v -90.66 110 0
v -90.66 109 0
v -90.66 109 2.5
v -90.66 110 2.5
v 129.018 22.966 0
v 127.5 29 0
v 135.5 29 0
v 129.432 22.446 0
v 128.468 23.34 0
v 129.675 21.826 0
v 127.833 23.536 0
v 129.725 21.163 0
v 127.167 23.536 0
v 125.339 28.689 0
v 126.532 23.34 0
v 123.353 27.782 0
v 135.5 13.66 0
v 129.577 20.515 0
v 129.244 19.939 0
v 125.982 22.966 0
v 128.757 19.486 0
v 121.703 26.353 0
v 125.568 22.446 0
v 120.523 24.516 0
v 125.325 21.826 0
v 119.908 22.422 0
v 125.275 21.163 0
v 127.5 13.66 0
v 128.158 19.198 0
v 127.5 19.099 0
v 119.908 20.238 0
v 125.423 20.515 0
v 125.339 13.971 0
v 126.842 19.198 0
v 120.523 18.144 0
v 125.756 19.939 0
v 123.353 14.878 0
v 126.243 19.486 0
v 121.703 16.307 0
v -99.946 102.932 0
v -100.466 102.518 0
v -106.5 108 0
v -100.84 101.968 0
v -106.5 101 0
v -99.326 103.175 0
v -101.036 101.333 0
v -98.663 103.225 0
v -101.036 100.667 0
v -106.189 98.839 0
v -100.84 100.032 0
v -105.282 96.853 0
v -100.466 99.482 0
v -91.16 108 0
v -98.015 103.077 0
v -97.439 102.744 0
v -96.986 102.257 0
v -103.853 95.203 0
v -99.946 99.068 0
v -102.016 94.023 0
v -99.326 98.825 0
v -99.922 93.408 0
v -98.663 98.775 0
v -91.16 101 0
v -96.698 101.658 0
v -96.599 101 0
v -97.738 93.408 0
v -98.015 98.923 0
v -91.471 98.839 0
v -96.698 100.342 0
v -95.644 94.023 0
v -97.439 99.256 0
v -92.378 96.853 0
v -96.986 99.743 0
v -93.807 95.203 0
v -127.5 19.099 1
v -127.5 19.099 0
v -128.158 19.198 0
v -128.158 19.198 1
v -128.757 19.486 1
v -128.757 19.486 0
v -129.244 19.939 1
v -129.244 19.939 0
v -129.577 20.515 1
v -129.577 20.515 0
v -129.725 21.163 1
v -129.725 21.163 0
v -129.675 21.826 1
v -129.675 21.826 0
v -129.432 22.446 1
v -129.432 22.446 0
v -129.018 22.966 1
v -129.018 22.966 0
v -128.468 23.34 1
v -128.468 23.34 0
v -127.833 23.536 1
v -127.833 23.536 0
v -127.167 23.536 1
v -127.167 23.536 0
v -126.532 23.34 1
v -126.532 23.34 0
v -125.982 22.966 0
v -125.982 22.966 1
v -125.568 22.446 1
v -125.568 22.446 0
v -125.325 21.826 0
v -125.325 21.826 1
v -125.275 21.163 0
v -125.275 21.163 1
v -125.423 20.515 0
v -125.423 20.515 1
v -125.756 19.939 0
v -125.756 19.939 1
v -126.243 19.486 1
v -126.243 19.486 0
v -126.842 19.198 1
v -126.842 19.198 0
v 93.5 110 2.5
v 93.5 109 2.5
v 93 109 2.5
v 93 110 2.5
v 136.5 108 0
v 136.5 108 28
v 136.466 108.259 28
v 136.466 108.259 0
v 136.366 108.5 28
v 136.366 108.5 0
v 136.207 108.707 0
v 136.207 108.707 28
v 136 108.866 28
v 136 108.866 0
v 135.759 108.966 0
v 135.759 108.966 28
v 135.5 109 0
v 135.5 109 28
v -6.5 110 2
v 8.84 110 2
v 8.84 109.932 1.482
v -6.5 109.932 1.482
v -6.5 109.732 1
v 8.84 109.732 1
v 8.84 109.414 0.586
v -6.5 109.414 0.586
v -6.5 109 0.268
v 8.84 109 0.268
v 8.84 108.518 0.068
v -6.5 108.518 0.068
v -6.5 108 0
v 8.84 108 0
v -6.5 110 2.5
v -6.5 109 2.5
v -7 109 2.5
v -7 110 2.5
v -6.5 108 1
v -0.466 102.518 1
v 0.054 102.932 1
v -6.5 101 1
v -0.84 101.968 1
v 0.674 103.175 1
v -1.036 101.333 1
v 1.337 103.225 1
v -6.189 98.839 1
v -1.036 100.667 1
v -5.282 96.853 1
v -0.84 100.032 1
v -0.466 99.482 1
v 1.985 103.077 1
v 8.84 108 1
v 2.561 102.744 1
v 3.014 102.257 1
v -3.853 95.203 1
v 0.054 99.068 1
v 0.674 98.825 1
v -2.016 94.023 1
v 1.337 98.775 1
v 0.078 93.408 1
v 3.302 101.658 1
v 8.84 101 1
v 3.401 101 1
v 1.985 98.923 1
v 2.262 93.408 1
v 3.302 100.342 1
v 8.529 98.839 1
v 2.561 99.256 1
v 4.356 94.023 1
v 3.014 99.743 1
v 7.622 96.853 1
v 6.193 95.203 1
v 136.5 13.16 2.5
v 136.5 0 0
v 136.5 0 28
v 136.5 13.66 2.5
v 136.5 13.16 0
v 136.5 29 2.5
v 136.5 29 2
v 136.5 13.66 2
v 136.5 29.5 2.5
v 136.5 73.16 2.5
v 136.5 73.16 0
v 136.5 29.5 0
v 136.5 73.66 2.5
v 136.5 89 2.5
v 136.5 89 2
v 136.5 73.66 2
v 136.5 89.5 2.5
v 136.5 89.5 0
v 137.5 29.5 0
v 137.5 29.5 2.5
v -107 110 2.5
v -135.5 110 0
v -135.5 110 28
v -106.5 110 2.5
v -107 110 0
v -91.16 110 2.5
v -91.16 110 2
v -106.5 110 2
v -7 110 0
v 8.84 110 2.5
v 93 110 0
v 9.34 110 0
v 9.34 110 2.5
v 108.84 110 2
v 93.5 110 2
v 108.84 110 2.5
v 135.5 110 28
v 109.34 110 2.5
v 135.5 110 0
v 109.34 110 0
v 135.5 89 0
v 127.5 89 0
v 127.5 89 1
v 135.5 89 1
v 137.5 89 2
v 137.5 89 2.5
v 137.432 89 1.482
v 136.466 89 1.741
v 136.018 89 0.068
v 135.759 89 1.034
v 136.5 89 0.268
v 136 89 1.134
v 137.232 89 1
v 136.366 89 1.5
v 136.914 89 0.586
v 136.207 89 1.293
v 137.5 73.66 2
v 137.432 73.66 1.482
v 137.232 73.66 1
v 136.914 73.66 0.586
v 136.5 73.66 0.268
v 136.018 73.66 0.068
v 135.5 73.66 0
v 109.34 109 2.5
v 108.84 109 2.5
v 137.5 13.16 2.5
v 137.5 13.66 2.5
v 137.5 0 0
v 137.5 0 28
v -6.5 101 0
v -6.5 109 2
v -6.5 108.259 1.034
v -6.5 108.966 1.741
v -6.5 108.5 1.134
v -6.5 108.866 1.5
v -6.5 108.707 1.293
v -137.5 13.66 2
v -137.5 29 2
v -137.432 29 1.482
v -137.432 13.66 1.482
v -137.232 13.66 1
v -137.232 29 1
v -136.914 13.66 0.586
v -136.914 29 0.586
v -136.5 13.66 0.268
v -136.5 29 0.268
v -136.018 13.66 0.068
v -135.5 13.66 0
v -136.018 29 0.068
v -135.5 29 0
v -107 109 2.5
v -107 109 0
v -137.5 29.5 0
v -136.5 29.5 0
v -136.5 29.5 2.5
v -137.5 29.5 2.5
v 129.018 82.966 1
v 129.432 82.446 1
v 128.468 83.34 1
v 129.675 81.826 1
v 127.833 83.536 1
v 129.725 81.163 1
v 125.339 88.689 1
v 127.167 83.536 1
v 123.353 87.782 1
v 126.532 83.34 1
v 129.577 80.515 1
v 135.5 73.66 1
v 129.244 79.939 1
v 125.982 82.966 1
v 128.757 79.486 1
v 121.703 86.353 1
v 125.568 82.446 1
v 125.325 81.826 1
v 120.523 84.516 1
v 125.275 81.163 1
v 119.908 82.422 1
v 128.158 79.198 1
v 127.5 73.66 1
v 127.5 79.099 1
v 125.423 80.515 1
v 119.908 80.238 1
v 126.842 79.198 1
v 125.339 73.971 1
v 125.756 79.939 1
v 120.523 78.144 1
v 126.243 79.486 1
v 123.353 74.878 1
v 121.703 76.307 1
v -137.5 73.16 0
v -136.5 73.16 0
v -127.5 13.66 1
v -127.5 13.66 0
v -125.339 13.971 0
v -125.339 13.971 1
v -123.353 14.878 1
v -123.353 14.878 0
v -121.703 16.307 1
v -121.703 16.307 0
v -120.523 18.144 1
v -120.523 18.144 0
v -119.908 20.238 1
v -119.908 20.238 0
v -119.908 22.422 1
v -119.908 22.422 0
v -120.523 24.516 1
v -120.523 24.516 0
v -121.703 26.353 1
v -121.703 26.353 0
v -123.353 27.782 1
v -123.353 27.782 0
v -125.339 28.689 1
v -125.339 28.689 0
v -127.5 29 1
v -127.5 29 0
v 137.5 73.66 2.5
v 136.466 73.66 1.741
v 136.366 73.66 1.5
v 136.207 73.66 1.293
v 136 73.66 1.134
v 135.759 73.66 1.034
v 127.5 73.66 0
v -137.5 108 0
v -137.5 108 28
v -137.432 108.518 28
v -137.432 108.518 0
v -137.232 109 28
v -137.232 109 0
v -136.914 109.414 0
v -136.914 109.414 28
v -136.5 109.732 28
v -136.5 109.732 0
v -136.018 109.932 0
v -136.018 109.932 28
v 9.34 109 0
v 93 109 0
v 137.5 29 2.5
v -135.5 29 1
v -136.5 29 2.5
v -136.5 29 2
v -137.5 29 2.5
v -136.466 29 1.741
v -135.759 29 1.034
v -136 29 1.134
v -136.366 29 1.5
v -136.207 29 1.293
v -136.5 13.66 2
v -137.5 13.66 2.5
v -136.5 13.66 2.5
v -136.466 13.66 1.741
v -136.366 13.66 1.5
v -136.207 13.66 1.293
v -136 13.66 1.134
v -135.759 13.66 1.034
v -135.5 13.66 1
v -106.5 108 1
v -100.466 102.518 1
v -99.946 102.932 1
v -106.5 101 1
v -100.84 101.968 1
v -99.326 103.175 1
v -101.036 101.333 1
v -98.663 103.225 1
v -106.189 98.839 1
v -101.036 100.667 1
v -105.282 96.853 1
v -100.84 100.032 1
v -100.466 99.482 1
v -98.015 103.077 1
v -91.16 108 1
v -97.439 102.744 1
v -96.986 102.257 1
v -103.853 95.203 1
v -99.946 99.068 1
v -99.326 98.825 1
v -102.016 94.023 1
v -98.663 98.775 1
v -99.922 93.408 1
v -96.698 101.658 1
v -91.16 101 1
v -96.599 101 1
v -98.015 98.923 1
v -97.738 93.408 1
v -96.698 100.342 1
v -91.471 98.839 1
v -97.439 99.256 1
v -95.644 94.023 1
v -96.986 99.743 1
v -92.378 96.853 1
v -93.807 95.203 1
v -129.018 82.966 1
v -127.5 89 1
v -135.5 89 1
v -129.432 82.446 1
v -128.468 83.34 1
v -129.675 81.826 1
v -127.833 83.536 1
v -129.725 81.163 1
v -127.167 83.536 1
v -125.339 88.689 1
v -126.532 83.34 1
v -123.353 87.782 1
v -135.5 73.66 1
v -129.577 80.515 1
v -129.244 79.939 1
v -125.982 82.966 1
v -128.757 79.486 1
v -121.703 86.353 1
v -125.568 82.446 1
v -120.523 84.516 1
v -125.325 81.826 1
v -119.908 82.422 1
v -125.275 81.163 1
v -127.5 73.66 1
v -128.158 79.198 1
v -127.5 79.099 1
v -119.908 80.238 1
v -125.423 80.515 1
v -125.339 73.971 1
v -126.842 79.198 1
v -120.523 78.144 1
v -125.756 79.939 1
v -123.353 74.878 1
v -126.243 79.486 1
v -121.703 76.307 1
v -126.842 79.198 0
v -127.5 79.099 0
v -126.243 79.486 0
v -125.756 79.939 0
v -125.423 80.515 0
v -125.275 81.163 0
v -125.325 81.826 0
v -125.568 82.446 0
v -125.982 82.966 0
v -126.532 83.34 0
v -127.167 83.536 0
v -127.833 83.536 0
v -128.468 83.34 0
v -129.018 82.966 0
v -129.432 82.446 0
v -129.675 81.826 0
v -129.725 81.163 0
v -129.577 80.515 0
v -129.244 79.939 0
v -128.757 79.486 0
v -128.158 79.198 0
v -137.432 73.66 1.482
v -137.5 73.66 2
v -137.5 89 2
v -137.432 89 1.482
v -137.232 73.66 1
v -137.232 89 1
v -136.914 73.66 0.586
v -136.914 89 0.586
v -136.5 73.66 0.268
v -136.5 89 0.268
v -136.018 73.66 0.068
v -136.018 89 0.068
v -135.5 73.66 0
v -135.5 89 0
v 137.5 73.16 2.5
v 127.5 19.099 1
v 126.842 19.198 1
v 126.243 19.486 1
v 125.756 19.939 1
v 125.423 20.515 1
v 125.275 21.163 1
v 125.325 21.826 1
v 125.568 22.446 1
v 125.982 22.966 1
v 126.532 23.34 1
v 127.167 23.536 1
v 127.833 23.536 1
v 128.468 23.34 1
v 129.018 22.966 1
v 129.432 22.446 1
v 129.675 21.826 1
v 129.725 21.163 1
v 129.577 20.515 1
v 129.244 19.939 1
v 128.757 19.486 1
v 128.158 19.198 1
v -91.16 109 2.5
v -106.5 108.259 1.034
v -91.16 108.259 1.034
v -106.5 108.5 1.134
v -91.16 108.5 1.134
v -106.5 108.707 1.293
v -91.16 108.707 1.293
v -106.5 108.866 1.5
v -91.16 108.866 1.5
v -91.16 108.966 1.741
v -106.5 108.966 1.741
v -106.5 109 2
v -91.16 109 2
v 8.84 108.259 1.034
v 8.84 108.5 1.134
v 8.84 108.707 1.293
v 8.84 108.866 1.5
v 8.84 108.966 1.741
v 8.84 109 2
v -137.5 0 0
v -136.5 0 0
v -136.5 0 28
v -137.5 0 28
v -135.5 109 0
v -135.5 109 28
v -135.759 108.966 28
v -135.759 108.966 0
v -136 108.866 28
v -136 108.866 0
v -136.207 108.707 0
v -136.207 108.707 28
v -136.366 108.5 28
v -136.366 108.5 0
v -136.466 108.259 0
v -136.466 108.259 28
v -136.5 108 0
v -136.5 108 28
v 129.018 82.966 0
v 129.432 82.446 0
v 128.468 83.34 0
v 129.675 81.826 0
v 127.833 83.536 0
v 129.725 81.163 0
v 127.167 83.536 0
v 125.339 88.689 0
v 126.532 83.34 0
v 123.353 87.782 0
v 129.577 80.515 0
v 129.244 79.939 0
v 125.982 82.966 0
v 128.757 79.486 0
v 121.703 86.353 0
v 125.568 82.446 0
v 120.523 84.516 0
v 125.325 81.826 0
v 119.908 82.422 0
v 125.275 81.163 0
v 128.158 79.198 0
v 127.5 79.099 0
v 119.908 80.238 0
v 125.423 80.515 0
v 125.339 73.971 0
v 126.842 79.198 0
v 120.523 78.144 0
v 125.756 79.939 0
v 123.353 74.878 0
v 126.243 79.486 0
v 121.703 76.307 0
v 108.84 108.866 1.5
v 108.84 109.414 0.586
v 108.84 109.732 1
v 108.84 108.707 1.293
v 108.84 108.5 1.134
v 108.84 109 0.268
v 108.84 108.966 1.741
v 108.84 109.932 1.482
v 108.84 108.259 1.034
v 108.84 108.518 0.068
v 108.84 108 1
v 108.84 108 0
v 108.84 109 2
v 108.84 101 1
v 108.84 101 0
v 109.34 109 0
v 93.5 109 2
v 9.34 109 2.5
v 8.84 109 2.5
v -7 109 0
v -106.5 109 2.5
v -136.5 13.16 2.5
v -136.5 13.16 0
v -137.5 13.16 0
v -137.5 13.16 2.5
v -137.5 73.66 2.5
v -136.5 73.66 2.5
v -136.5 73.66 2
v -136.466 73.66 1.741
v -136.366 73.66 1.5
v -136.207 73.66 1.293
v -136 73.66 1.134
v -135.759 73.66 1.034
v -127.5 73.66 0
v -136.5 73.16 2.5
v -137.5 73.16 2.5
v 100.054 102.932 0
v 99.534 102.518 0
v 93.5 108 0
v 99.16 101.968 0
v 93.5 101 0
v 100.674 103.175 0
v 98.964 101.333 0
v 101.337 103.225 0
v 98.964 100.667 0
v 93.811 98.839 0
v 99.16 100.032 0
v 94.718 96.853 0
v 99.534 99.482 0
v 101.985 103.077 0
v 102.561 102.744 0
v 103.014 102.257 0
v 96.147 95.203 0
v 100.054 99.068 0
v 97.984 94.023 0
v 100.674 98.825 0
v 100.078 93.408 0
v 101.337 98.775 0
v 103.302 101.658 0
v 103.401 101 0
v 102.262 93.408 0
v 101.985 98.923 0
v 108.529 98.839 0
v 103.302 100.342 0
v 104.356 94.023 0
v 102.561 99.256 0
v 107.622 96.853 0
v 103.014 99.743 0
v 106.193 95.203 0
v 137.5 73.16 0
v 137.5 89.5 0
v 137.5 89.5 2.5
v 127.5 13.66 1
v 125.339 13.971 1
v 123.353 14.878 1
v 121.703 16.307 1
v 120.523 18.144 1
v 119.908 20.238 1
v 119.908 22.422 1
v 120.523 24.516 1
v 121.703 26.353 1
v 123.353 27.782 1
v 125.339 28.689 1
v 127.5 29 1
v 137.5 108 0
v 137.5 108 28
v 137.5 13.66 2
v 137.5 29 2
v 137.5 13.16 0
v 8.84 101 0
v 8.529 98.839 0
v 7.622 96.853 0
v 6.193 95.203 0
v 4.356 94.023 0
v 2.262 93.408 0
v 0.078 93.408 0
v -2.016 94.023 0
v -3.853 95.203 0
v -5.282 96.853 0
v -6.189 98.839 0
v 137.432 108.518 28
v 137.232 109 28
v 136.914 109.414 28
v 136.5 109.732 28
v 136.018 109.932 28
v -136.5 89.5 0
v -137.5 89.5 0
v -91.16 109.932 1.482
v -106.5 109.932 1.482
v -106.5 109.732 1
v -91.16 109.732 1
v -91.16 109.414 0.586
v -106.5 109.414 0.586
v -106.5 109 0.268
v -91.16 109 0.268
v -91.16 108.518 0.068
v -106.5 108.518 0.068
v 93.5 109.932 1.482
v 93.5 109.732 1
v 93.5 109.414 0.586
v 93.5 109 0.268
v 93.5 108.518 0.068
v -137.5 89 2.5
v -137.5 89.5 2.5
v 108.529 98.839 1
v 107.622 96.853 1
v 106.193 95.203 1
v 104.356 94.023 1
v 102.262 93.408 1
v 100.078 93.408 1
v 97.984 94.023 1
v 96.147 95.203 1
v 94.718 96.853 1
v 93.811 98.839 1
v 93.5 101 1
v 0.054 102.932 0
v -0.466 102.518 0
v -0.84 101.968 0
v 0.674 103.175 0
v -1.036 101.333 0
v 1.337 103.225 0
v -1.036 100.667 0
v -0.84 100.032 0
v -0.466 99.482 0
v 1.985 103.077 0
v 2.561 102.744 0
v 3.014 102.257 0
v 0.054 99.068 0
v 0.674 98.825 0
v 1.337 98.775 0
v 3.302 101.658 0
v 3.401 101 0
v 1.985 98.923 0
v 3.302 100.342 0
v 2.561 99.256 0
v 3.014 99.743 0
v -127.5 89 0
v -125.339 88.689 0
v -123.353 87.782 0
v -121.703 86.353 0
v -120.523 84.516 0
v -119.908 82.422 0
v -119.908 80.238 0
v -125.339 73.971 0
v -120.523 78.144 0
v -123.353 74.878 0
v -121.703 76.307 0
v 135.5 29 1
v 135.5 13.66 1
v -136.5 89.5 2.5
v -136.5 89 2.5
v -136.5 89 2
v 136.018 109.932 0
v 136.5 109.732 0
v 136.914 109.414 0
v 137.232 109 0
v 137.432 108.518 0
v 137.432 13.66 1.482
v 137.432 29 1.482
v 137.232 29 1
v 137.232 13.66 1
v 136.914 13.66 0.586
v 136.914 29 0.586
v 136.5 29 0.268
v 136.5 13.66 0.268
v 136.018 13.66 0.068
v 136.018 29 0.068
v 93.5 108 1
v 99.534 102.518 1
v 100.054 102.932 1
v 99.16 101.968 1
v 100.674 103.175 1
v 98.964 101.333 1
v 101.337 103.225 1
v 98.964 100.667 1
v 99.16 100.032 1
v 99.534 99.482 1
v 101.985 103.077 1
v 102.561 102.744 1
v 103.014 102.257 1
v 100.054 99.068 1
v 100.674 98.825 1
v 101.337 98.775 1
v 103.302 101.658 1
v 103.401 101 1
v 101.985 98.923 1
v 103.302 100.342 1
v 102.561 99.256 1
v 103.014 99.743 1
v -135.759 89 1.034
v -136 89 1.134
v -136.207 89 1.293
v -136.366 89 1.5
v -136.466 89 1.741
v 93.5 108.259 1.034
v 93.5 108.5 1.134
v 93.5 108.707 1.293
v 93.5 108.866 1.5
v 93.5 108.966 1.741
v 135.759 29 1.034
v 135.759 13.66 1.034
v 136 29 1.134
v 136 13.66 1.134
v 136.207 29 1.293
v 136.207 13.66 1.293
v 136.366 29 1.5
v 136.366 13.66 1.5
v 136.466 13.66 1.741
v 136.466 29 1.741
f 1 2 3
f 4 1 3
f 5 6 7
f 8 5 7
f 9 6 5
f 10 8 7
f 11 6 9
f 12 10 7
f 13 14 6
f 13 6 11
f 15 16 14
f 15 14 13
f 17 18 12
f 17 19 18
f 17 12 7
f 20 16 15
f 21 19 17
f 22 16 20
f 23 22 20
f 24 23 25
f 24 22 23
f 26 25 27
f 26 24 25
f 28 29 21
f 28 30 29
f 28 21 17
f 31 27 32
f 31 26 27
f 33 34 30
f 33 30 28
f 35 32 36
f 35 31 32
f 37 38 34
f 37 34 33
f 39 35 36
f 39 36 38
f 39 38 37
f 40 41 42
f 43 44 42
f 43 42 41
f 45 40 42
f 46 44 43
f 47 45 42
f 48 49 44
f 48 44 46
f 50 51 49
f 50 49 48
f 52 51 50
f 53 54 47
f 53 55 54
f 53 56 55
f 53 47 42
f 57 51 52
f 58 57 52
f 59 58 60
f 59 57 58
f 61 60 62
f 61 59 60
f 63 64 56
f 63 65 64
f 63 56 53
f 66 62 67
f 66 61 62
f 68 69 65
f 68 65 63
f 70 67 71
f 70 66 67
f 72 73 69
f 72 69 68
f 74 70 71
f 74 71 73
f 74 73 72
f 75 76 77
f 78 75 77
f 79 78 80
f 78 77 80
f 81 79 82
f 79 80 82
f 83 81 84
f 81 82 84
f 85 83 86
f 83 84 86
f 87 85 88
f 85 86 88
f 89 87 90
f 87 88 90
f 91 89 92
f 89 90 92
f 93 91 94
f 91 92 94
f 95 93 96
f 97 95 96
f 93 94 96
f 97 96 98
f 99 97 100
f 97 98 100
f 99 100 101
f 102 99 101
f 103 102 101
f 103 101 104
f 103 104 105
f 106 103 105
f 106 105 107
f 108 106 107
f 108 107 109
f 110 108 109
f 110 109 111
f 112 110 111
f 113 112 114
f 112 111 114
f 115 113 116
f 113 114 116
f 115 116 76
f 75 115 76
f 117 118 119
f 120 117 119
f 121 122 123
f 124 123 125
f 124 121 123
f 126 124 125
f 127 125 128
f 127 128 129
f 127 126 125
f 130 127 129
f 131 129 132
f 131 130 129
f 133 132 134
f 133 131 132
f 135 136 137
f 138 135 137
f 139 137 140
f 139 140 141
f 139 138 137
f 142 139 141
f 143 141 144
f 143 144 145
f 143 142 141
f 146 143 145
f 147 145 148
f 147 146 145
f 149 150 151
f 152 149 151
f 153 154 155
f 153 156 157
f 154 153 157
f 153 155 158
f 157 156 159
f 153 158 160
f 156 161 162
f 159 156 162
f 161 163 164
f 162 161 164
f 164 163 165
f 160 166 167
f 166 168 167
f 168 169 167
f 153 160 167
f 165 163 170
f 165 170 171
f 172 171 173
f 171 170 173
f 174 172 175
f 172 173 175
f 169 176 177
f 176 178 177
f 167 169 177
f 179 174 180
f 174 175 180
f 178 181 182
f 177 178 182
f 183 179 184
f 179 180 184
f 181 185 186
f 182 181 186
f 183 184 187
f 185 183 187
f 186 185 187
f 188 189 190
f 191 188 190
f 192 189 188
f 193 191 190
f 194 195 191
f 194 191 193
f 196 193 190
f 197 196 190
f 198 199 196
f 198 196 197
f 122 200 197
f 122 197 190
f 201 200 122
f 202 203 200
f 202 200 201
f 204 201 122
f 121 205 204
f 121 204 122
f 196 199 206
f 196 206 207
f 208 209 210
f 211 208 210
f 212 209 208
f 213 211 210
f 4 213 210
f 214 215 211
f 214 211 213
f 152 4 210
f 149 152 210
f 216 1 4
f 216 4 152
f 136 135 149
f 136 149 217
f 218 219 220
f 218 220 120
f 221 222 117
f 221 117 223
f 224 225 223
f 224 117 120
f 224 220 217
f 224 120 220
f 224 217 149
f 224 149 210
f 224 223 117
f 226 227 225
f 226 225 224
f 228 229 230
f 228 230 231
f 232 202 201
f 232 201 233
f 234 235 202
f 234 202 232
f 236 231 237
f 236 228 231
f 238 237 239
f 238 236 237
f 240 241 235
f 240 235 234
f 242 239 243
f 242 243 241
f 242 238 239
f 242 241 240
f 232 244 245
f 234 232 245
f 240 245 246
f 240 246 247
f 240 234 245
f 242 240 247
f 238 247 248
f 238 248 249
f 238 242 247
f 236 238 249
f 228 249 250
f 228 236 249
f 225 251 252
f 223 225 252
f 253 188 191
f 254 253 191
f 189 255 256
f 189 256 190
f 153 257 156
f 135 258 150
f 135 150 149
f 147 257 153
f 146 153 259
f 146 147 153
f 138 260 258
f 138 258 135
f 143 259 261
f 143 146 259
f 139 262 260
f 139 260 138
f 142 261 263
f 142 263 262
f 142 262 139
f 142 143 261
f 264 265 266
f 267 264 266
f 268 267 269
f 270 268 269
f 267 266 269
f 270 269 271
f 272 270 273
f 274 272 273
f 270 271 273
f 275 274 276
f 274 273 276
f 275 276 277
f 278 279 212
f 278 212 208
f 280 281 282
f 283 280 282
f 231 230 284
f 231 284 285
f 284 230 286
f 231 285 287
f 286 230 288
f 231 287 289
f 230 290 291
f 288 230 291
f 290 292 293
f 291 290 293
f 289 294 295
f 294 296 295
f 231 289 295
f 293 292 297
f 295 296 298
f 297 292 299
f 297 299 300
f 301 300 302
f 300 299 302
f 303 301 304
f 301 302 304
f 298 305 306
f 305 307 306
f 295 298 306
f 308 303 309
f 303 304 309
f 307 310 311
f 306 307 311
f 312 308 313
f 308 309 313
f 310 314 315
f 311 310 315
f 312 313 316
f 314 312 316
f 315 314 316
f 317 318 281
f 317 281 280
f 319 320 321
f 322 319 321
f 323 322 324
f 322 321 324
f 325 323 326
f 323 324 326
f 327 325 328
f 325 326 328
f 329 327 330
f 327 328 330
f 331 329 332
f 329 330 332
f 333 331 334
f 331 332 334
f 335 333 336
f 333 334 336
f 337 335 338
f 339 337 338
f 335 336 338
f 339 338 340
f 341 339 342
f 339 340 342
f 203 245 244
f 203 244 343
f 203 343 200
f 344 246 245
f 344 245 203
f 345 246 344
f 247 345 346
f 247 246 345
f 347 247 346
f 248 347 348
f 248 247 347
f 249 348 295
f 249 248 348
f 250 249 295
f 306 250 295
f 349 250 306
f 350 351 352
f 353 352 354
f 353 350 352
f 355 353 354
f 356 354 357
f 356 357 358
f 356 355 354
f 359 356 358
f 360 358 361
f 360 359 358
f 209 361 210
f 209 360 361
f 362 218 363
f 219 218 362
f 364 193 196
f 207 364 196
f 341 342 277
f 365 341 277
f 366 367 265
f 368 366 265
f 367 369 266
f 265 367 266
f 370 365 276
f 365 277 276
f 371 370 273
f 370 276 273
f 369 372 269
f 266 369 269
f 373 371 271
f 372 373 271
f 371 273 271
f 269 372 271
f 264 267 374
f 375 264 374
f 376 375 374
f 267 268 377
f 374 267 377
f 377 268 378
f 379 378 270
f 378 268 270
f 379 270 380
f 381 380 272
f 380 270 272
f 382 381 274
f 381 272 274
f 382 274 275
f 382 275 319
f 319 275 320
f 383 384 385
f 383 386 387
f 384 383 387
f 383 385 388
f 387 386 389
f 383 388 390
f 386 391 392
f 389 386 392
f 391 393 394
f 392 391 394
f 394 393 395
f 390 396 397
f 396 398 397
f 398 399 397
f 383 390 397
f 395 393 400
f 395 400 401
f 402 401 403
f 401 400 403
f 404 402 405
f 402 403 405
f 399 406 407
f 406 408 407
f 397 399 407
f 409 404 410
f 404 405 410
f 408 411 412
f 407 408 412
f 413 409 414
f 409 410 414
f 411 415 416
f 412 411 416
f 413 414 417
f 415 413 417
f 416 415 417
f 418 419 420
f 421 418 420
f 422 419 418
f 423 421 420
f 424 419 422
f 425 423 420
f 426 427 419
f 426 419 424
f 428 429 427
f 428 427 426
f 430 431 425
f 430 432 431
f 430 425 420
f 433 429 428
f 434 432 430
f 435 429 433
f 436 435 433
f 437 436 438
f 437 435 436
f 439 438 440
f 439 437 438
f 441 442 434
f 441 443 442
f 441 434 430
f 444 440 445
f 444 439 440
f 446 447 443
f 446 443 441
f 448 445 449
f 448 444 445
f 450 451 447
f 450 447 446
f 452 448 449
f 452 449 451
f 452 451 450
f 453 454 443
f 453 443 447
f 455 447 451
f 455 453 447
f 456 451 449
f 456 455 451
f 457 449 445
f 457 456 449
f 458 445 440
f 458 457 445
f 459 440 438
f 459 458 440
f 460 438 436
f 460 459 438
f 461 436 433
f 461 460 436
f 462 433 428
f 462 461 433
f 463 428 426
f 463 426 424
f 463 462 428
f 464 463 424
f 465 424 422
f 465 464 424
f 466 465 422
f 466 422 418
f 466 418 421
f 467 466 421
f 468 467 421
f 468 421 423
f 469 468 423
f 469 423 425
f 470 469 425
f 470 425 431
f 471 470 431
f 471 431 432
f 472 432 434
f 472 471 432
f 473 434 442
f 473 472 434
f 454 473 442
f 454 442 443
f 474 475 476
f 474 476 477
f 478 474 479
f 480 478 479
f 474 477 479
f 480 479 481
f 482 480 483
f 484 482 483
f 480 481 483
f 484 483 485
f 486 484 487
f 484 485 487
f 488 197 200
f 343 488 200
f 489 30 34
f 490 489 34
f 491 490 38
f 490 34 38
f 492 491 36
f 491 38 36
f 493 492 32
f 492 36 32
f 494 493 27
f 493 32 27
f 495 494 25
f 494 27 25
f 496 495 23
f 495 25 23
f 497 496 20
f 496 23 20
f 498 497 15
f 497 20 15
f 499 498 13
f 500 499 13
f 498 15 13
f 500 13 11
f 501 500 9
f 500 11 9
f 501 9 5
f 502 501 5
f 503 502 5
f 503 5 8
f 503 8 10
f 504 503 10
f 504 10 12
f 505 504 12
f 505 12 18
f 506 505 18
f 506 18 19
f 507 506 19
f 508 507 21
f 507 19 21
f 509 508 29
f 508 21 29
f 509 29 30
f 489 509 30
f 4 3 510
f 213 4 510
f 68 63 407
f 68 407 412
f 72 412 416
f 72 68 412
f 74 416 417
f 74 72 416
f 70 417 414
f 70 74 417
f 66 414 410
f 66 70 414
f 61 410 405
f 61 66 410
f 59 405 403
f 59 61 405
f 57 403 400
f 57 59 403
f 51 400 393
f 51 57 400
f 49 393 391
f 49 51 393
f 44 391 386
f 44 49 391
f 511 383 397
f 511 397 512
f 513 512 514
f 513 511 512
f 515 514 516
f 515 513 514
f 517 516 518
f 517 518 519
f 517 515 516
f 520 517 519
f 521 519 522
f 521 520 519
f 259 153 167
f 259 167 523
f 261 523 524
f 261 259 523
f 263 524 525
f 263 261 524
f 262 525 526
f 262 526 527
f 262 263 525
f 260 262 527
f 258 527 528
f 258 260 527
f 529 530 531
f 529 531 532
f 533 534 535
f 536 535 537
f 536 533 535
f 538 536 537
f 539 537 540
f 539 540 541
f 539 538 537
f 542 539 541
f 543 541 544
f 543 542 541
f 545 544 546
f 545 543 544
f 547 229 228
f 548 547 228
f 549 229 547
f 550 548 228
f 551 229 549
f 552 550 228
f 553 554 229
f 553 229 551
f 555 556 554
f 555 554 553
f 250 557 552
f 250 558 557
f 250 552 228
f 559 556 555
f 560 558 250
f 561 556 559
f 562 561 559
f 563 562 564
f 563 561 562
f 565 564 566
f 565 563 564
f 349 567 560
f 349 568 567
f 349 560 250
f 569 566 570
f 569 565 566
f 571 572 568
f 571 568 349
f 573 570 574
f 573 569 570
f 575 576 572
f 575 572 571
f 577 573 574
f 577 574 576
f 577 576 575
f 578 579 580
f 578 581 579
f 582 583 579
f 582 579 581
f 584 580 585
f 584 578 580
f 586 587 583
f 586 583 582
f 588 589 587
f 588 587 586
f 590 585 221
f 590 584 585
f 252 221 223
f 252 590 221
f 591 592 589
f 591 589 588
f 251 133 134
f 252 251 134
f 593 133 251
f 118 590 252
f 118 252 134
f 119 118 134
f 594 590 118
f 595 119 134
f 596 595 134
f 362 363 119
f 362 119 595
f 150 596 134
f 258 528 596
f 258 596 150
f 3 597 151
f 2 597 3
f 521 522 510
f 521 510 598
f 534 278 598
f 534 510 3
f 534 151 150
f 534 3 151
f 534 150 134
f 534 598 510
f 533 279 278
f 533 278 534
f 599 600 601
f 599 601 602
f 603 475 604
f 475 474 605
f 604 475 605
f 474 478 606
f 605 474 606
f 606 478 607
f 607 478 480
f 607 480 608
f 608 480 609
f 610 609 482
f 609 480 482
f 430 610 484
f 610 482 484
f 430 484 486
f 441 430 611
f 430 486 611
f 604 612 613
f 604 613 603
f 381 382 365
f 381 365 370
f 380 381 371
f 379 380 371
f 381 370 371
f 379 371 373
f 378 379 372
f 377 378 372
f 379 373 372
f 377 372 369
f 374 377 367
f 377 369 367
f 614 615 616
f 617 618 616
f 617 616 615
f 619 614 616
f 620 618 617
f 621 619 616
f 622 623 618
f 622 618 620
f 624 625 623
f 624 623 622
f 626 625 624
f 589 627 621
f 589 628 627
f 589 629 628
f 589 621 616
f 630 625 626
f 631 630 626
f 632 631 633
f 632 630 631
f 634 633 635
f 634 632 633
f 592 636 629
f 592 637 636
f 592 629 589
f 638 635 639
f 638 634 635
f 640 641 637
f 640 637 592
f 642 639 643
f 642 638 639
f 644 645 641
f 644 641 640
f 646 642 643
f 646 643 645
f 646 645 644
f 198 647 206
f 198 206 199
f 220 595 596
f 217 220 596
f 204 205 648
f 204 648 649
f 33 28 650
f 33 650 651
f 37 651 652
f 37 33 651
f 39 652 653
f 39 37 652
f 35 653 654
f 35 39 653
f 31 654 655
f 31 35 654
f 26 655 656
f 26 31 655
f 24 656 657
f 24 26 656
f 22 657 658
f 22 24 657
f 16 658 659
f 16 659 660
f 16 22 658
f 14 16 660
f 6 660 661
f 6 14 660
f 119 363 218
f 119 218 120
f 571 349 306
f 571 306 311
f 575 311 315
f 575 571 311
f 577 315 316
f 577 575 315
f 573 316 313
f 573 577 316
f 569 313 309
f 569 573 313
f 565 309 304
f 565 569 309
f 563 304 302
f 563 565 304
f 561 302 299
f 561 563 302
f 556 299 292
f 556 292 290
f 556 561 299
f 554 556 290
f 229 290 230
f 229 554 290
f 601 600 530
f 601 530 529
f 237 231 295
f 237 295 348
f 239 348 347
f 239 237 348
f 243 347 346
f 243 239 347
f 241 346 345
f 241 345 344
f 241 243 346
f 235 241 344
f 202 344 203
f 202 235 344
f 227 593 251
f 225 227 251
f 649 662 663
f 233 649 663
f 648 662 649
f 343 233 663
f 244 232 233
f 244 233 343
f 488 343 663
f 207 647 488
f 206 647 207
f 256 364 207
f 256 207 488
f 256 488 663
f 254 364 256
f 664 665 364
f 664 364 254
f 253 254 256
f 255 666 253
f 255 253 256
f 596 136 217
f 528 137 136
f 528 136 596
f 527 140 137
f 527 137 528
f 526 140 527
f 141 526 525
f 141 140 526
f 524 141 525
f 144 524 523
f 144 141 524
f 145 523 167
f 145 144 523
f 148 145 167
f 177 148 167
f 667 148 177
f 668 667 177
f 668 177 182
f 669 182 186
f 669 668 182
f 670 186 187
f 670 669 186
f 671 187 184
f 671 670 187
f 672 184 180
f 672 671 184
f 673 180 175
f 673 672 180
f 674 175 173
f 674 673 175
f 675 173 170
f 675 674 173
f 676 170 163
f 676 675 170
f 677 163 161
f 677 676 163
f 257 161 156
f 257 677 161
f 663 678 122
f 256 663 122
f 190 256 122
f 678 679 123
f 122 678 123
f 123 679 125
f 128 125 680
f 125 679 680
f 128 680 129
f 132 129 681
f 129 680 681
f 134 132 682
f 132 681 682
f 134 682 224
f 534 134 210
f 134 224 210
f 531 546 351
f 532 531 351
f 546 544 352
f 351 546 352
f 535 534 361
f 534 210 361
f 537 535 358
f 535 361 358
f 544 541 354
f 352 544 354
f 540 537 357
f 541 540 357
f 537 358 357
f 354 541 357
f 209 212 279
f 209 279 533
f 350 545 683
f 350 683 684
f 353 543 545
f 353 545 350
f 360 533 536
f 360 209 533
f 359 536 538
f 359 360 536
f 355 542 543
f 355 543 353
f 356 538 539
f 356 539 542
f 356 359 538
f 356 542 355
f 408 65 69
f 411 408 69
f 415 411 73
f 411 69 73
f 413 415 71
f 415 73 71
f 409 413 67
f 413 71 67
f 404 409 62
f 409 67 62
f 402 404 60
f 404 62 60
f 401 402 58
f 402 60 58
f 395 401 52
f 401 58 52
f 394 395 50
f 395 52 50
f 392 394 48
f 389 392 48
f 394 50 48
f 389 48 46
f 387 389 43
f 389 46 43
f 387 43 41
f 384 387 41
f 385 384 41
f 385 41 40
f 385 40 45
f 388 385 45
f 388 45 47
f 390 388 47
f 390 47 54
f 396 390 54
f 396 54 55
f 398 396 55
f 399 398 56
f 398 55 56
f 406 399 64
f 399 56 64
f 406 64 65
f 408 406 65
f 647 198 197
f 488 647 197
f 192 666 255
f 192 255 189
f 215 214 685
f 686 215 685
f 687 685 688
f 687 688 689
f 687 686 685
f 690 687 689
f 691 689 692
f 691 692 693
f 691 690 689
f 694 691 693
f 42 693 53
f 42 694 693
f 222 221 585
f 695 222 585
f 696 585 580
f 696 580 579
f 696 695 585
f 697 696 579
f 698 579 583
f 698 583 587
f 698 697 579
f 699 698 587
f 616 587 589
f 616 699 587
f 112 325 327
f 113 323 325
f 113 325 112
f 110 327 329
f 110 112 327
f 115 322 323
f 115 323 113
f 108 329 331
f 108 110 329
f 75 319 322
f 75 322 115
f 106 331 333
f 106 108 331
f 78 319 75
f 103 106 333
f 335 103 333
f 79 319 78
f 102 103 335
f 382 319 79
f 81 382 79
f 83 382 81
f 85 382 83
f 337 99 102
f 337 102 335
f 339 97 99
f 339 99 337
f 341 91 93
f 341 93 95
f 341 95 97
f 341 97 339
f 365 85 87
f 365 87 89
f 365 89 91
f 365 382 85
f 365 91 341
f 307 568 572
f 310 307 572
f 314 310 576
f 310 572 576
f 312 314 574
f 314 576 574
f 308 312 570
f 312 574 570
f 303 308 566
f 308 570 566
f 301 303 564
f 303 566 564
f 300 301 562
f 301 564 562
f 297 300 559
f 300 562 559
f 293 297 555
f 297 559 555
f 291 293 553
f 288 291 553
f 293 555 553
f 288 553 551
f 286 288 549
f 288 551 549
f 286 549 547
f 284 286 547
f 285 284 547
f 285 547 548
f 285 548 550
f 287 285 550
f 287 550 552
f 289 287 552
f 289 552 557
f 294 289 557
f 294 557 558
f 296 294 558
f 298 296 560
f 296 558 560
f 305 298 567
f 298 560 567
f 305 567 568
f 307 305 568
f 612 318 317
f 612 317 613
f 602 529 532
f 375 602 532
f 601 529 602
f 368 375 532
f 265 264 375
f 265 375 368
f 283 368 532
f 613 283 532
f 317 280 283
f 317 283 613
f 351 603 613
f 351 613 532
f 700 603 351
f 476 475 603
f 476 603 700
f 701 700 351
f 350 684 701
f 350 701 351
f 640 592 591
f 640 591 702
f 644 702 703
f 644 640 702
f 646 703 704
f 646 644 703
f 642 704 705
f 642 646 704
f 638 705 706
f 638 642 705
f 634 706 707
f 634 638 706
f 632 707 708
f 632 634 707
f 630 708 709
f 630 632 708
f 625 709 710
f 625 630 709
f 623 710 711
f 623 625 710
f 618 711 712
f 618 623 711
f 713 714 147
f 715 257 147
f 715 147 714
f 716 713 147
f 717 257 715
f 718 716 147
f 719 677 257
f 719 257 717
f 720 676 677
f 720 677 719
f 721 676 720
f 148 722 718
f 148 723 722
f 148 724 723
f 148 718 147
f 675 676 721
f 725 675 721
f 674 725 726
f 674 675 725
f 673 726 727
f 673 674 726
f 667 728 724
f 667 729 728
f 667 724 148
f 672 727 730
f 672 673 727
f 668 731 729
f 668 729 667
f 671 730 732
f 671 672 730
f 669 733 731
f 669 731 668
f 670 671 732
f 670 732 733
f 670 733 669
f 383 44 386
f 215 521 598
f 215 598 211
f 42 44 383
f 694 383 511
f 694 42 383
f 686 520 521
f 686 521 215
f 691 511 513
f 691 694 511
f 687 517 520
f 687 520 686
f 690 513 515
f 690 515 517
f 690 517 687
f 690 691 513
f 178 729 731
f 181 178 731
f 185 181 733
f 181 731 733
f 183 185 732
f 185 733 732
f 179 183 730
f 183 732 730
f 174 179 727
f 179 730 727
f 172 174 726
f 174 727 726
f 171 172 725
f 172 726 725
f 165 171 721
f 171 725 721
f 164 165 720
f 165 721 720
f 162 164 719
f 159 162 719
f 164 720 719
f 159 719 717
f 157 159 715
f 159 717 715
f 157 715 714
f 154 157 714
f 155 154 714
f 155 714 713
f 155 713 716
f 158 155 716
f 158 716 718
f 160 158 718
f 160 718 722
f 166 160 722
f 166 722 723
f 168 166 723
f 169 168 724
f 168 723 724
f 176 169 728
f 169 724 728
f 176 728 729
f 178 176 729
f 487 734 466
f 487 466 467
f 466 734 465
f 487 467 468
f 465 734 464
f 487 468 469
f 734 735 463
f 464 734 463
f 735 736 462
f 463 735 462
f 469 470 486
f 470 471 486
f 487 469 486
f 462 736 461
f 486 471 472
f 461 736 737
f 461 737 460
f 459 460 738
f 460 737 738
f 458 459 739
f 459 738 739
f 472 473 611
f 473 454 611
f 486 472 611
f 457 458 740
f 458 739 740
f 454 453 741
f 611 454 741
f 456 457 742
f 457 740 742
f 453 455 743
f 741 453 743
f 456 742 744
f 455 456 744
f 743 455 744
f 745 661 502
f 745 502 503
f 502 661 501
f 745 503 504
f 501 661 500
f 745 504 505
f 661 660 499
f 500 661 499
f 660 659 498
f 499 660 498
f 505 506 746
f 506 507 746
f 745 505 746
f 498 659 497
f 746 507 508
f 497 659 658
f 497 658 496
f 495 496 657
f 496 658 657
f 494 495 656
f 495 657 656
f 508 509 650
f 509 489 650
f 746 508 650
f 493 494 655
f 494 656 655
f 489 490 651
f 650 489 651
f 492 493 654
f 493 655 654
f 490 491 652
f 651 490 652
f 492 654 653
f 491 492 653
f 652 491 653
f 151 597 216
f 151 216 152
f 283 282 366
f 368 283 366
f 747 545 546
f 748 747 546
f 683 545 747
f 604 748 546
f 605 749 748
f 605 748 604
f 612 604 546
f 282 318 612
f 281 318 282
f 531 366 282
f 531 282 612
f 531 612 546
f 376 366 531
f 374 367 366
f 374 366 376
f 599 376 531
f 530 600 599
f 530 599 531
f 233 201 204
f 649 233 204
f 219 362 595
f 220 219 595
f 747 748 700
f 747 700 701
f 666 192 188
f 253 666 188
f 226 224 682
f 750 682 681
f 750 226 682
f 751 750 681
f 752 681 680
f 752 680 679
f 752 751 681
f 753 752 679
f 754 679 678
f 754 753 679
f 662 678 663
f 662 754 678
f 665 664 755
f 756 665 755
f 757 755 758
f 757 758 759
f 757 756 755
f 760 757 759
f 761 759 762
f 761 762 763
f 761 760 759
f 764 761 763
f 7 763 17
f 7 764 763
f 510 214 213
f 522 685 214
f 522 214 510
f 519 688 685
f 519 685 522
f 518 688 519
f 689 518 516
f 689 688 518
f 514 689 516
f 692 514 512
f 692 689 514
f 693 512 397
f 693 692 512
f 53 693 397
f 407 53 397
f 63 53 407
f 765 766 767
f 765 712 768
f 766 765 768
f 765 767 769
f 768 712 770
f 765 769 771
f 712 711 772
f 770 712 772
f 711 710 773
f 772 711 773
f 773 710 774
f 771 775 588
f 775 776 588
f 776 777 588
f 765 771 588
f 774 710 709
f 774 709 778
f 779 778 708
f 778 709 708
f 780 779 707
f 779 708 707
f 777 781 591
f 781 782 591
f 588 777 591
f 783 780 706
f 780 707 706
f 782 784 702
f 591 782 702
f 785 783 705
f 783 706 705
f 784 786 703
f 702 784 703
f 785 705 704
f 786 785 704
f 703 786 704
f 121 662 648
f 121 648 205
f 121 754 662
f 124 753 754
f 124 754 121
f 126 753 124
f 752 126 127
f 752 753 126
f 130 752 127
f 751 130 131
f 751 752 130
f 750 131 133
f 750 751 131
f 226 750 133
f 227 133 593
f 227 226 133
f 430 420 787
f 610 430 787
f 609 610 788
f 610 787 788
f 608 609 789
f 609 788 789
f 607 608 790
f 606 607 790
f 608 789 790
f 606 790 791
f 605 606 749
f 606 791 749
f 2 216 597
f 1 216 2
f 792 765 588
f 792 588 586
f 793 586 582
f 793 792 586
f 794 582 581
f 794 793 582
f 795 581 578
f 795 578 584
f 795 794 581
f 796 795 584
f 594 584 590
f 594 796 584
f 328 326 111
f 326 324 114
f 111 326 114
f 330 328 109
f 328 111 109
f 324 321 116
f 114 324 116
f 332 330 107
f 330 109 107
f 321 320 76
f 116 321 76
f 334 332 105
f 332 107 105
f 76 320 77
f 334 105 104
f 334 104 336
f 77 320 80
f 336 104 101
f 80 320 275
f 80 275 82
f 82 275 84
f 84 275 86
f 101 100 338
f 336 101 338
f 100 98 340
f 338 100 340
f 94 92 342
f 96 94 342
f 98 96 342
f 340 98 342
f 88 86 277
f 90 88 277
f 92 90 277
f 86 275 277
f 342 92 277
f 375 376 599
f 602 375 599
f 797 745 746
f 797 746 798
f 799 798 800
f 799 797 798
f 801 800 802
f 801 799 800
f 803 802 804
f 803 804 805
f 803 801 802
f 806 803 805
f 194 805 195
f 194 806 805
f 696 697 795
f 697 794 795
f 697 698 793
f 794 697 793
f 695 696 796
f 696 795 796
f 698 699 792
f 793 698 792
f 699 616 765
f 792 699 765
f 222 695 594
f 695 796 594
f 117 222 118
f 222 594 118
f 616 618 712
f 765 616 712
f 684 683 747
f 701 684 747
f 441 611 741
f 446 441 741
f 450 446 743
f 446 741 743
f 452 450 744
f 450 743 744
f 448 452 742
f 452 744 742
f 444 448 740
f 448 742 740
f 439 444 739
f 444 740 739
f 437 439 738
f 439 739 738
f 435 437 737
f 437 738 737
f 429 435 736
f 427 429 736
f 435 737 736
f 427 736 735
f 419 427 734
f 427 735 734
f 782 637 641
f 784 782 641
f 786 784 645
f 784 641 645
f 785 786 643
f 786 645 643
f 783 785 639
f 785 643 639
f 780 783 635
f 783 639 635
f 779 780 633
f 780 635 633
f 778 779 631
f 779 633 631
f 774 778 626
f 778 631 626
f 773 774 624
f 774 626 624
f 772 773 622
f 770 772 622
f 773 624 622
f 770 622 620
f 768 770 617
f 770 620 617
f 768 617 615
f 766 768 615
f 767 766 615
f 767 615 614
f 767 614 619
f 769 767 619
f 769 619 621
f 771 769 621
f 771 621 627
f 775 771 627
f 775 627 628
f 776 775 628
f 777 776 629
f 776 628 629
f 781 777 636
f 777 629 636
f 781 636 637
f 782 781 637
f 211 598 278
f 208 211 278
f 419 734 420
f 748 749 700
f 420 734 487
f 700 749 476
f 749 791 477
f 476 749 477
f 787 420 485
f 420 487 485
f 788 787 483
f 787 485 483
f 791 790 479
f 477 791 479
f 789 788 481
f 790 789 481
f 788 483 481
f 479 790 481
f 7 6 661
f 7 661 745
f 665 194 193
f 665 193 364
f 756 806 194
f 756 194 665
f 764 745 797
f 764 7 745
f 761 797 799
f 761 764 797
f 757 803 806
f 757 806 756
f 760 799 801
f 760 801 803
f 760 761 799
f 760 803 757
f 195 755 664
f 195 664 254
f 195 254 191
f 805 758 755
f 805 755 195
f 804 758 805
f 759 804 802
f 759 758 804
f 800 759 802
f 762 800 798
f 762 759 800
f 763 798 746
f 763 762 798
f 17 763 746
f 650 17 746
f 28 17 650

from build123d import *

# Parameters (mm, degrees)
SM_BASE_FLANGE_1_DEPTH            = 28
SM_EDGE_FLANGE_1_STRIP_W          = 6
SM_EDGE_FLANGE_1_STRIP_H          = 1
SM_EDGE_FLANGE_1_STRIP_CUT_DEPTH  = 15.34
SM_EDGE_FLANGE_1_RELIEF_W         = 6.5
SM_EDGE_FLANGE_1_RELIEF_H         = 0.5
SM_EDGE_FLANGE_1_RELIEF_CUT_DEPTH = 1
SM_EDGE_FLANGE_1_DEPTH            = 15.34
SM_EDGE_FLANGE_1_PROFILE_R        = 2.231207153
SM_EDGE_FLANGE_1_FLAT_DEPTH       = 1
PATTERN_LINEAR_1_COUNT            = 2
PATTERN_LINEAR_1_PITCH            = 60
MIRROR_1_COPY_1_SKETCH_W          = 6
MIRROR_1_COPY_1_SKETCH_H          = 1
MIRROR_1_COPY_1_DEPTH             = 15.34
MIRROR_1_COPY_2_SKETCH_W          = 6.5
MIRROR_1_COPY_2_SKETCH_H          = 0.5
MIRROR_1_COPY_2_DEPTH             = 1
MIRROR_1_COPY_3_DEPTH             = 15.34
MIRROR_1_COPY_4_SKETCH_R          = 2.231207153
MIRROR_1_COPY_4_DEPTH             = 1
SM_EDGE_FLANGE_2_STRIP_W          = 6
SM_EDGE_FLANGE_2_STRIP_H          = 1
SM_EDGE_FLANGE_2_STRIP_CUT_DEPTH  = 15.34
SM_EDGE_FLANGE_2_RELIEF_W         = 6.5
SM_EDGE_FLANGE_2_RELIEF_H         = 0.5
SM_EDGE_FLANGE_2_RELIEF_CUT_DEPTH = 1
SM_EDGE_FLANGE_2_DEPTH            = 15.34
SM_EDGE_FLANGE_2_PROFILE_R        = 2.231207153
SM_EDGE_FLANGE_2_FLAT_DEPTH       = 1
PATTERN_LINEAR_2_COUNT            = 3
PATTERN_LINEAR_2_PITCH            = 100


# Sheet-metal steps are written as plain solids
with BuildPart() as part:
    # Sketch 2 → Базовая кромка1 (new body)
    with BuildSketch(Plane.XY):
        with BuildLine():
            Line((-137.5, 0), (-137.5, 108))
            ThreePointArc((-137.5, 108), (-136.914213562, 109.414213562), (-135.5, 110))
            Line((-135.5, 110), (135.5, 110))
            ThreePointArc((135.5, 110), (136.914213562, 109.414213562), (137.5, 108))
            Line((137.5, 108), (137.5, 0))
            Line((137.5, 0), (136.5, 0))
            Line((136.5, 0), (136.5, 108))
            ThreePointArc((136.5, 108), (136.207106781, 108.707106781), (135.5, 109))
            Line((135.5, 109), (-135.5, 109))
            ThreePointArc((-135.5, 109), (-136.207106781, 108.707106781), (-136.5, 108))
            Line((-136.5, 108), (-136.5, 0))
            Line((-136.5, 0), (-137.5, 0))
        make_face()
    extrude(amount=SM_BASE_FLANGE_1_DEPTH)

    # Ребро-кромка1 strip (across the edge) → Ребро-кромка1 strip cut (cut)
    with BuildSketch(Plane(origin=(136.5, 89, 0), x_dir=(0, 0, 1), z_dir=(0, -1, 0))):
        with Locations((-1, -0.5)):
            Rectangle(SM_EDGE_FLANGE_1_STRIP_W, SM_EDGE_FLANGE_1_STRIP_H)
    sm_edge_flange_1_strip_cut = extrude(amount=SM_EDGE_FLANGE_1_STRIP_CUT_DEPTH, mode=Mode.SUBTRACT)

    # Ребро-кромка1 relief (on the sheet) → Ребро-кромка1 relief cut (cut)
    with BuildSketch(Plane(origin=(136.5, 89, 2), x_dir=(0, 0, 1), z_dir=(-1, 0, 0))):
        with Locations((-2.75, 0.25)):
            Rectangle(SM_EDGE_FLANGE_1_RELIEF_W, SM_EDGE_FLANGE_1_RELIEF_H)
        with Locations((-2.75, -15.59)):
            Rectangle(SM_EDGE_FLANGE_1_RELIEF_W, SM_EDGE_FLANGE_1_RELIEF_H)
    sm_edge_flange_1_relief_cut = extrude(amount=-SM_EDGE_FLANGE_1_RELIEF_CUT_DEPTH, mode=Mode.SUBTRACT)

    # Ребро-кромка1 bend section (across the edge) → Ребро-кромка1 (add)
    with BuildSketch(Plane(origin=(136.5, 89, 0), x_dir=(0, 0, 1), z_dir=(0, -1, 0))):
        with BuildLine():
            Line((0, 1), (1, 1))
            ThreePointArc((1, 1), (1.292893219, 0.292893219), (2, 0))
            Line((2, 0), (2, -1))
            ThreePointArc((2, -1), (0.585786438, -0.414213562), (0, 1))
        make_face()
    sm_edge_flange_1 = extrude(amount=SM_EDGE_FLANGE_1_DEPTH)

    # Ребро-кромка1 profile (on flange) → Ребро-кромка1 flat (add)
    with BuildSketch(Plane(origin=(136.5, 0, 0), x_dir=(0, -1, 0), z_dir=(0, 0, -1))):
        with BuildLine():
            ThreePointArc((-73.66, 9), (-81.33, 16.67), (-89, 9))
            Line((-89, 9), (-89, 1))
            Line((-89, 1), (-73.66, 1))
            Line((-73.66, 1), (-73.66, 9))
        make_face()
        with Locations((-81.33, 9)):
            Circle(SM_EDGE_FLANGE_1_PROFILE_R, mode=Mode.SUBTRACT)
    sm_edge_flange_1_flat = extrude(amount=-SM_EDGE_FLANGE_1_FLAT_DEPTH)

    # Линейный массив1: Ребро-кромка1 strip cut, Ребро-кромка1 relief cut, Ребро-кромка1, Ребро-кромка1 flat ×2
    with Locations(*[(0, -i * PATTERN_LINEAR_1_PITCH, 0) for i in range(1, PATTERN_LINEAR_1_COUNT)]):
        add(sm_edge_flange_1_strip_cut, mode=Mode.SUBTRACT)
        add(sm_edge_flange_1_relief_cut, mode=Mode.SUBTRACT)
        add(sm_edge_flange_1)
        add(sm_edge_flange_1_flat)

    # Зеркальное отражение1: Ребро-кромка1 strip cut, Ребро-кромка1 relief cut, Ребро-кромка1, Ребро-кромка1 flat across plane
    add(sm_edge_flange_1_strip_cut.mirror(Plane(origin=(0, 0, 0), x_dir=(0, 0, 1), z_dir=(1, 0, 0))), mode=Mode.SUBTRACT)
    add(sm_edge_flange_1_relief_cut.mirror(Plane(origin=(0, 0, 0), x_dir=(0, 0, 1), z_dir=(1, 0, 0))), mode=Mode.SUBTRACT)
    add(sm_edge_flange_1.mirror(Plane(origin=(0, 0, 0), x_dir=(0, 0, 1), z_dir=(1, 0, 0))))
    add(sm_edge_flange_1_flat.mirror(Plane(origin=(0, 0, 0), x_dir=(0, 0, 1), z_dir=(1, 0, 0))))

    # Зеркальное отражение1 copy 1 sketch → Зеркальное отражение1 copy 1 (cut)
    with BuildSketch(Plane(origin=(-136.5, 29, 0), x_dir=(0, 0, 1), z_dir=(0, -1, 0))):
        with Locations((-1, 0.5)):
            Rectangle(MIRROR_1_COPY_1_SKETCH_W, MIRROR_1_COPY_1_SKETCH_H)
    extrude(amount=MIRROR_1_COPY_1_DEPTH, mode=Mode.SUBTRACT)

    # Зеркальное отражение1 copy 2 sketch → Зеркальное отражение1 copy 2 (cut)
    with BuildSketch(Plane(origin=(-136.5, 29, 2), x_dir=(0, 0, 1), z_dir=(1, 0, 0))):
        with Locations((-2.75, -0.25)):
            Rectangle(MIRROR_1_COPY_2_SKETCH_W, MIRROR_1_COPY_2_SKETCH_H)
        with Locations((-2.75, 15.59)):
            Rectangle(MIRROR_1_COPY_2_SKETCH_W, MIRROR_1_COPY_2_SKETCH_H)
    extrude(amount=-MIRROR_1_COPY_2_DEPTH, mode=Mode.SUBTRACT)

    # Зеркальное отражение1 copy 3 sketch → Зеркальное отражение1 copy 3 (add)
    with BuildSketch(Plane(origin=(-136.5, 29, 0), x_dir=(0, 0, 1), z_dir=(0, -1, 0))):
        with BuildLine():
            Line((0, -1), (1, -1))
            ThreePointArc((1, -1), (1.292893219, -0.292893219), (2, 0))
            Line((2, 0), (2, 1))
            ThreePointArc((2, 1), (0.585786438, 0.414213562), (0, -1))
        make_face()
    extrude(amount=MIRROR_1_COPY_3_DEPTH)

    # Зеркальное отражение1 copy 4 sketch → Зеркальное отражение1 copy 4 (add)
    with BuildSketch(Plane(origin=(-136.5, -60, 0), x_dir=(0, -1, 0), z_dir=(0, 0, -1))):
        with BuildLine():
            ThreePointArc((-73.66, -9), (-81.33, -16.67), (-89, -9))
            Line((-89, -9), (-89, -1))
            Line((-89, -1), (-73.66, -1))
            Line((-73.66, -1), (-73.66, -9))
        make_face()
        with Locations((-81.33, -9)):
            Circle(MIRROR_1_COPY_4_SKETCH_R, mode=Mode.SUBTRACT)
    extrude(amount=-MIRROR_1_COPY_4_DEPTH)

    # Ребро-кромка2 strip (across the edge) → Ребро-кромка2 strip cut (cut)
    with BuildSketch(Plane(origin=(-106.5, 109, 0), x_dir=(0, 0, 1), z_dir=(1, 0, 0))):
        with Locations((-1, -0.5)):
            Rectangle(SM_EDGE_FLANGE_2_STRIP_W, SM_EDGE_FLANGE_2_STRIP_H)
    sm_edge_flange_2_strip_cut = extrude(amount=SM_EDGE_FLANGE_2_STRIP_CUT_DEPTH, mode=Mode.SUBTRACT)

    # Ребро-кромка2 relief (on the sheet) → Ребро-кромка2 relief cut (cut)
    with BuildSketch(Plane(origin=(-106.5, 109, 2), x_dir=(0, 0, 1), z_dir=(0, -1, 0))):
        with Locations((-2.75, 0.25)):
            Rectangle(SM_EDGE_FLANGE_2_RELIEF_W, SM_EDGE_FLANGE_2_RELIEF_H)
        with Locations((-2.75, -15.59)):
            Rectangle(SM_EDGE_FLANGE_2_RELIEF_W, SM_EDGE_FLANGE_2_RELIEF_H)
    sm_edge_flange_2_relief_cut = extrude(amount=-SM_EDGE_FLANGE_2_RELIEF_CUT_DEPTH, mode=Mode.SUBTRACT)

    # Ребро-кромка2 bend section (across the edge) → Ребро-кромка2 (add)
    with BuildSketch(Plane(origin=(-106.5, 109, 0), x_dir=(0, 0, 1), z_dir=(1, 0, 0))):
        with BuildLine():
            Line((0, 1), (1, 1))
            ThreePointArc((1, 1), (1.292893219, 0.292893219), (2, 0))
            Line((2, 0), (2, -1))
            ThreePointArc((2, -1), (0.585786438, -0.414213562), (0, 1))
        make_face()
    sm_edge_flange_2 = extrude(amount=SM_EDGE_FLANGE_2_DEPTH)

    # Ребро-кромка2 profile (on flange) → Ребро-кромка2 flat (add)
    with BuildSketch(Plane(origin=(0, 109, 0), x_dir=(1, 0, 0), z_dir=(0, 0, -1))):
        with BuildLine():
            ThreePointArc((-91.16, 8), (-98.829997184, 15.670005632), (-106.5, 8.000005632))
            Line((-106.5, 8.000005632), (-106.5, 1))
            Line((-106.5, 1), (-91.16, 1))
            Line((-91.16, 1), (-91.16, 8))
        make_face()
        with Locations((-98.83, 8.000005632)):
            Circle(SM_EDGE_FLANGE_2_PROFILE_R, mode=Mode.SUBTRACT)
    sm_edge_flange_2_flat = extrude(amount=-SM_EDGE_FLANGE_2_FLAT_DEPTH)

    # Линейный массив2: Ребро-кромка2 strip cut, Ребро-кромка2 relief cut, Ребро-кромка2, Ребро-кромка2 flat ×3
    with Locations(*[(i * PATTERN_LINEAR_2_PITCH, 0, 0) for i in range(1, PATTERN_LINEAR_2_COUNT)]):
        add(sm_edge_flange_2_strip_cut, mode=Mode.SUBTRACT)
        add(sm_edge_flange_2_relief_cut, mode=Mode.SUBTRACT)
        add(sm_edge_flange_2)
        add(sm_edge_flange_2_flat)


solid = part.part
